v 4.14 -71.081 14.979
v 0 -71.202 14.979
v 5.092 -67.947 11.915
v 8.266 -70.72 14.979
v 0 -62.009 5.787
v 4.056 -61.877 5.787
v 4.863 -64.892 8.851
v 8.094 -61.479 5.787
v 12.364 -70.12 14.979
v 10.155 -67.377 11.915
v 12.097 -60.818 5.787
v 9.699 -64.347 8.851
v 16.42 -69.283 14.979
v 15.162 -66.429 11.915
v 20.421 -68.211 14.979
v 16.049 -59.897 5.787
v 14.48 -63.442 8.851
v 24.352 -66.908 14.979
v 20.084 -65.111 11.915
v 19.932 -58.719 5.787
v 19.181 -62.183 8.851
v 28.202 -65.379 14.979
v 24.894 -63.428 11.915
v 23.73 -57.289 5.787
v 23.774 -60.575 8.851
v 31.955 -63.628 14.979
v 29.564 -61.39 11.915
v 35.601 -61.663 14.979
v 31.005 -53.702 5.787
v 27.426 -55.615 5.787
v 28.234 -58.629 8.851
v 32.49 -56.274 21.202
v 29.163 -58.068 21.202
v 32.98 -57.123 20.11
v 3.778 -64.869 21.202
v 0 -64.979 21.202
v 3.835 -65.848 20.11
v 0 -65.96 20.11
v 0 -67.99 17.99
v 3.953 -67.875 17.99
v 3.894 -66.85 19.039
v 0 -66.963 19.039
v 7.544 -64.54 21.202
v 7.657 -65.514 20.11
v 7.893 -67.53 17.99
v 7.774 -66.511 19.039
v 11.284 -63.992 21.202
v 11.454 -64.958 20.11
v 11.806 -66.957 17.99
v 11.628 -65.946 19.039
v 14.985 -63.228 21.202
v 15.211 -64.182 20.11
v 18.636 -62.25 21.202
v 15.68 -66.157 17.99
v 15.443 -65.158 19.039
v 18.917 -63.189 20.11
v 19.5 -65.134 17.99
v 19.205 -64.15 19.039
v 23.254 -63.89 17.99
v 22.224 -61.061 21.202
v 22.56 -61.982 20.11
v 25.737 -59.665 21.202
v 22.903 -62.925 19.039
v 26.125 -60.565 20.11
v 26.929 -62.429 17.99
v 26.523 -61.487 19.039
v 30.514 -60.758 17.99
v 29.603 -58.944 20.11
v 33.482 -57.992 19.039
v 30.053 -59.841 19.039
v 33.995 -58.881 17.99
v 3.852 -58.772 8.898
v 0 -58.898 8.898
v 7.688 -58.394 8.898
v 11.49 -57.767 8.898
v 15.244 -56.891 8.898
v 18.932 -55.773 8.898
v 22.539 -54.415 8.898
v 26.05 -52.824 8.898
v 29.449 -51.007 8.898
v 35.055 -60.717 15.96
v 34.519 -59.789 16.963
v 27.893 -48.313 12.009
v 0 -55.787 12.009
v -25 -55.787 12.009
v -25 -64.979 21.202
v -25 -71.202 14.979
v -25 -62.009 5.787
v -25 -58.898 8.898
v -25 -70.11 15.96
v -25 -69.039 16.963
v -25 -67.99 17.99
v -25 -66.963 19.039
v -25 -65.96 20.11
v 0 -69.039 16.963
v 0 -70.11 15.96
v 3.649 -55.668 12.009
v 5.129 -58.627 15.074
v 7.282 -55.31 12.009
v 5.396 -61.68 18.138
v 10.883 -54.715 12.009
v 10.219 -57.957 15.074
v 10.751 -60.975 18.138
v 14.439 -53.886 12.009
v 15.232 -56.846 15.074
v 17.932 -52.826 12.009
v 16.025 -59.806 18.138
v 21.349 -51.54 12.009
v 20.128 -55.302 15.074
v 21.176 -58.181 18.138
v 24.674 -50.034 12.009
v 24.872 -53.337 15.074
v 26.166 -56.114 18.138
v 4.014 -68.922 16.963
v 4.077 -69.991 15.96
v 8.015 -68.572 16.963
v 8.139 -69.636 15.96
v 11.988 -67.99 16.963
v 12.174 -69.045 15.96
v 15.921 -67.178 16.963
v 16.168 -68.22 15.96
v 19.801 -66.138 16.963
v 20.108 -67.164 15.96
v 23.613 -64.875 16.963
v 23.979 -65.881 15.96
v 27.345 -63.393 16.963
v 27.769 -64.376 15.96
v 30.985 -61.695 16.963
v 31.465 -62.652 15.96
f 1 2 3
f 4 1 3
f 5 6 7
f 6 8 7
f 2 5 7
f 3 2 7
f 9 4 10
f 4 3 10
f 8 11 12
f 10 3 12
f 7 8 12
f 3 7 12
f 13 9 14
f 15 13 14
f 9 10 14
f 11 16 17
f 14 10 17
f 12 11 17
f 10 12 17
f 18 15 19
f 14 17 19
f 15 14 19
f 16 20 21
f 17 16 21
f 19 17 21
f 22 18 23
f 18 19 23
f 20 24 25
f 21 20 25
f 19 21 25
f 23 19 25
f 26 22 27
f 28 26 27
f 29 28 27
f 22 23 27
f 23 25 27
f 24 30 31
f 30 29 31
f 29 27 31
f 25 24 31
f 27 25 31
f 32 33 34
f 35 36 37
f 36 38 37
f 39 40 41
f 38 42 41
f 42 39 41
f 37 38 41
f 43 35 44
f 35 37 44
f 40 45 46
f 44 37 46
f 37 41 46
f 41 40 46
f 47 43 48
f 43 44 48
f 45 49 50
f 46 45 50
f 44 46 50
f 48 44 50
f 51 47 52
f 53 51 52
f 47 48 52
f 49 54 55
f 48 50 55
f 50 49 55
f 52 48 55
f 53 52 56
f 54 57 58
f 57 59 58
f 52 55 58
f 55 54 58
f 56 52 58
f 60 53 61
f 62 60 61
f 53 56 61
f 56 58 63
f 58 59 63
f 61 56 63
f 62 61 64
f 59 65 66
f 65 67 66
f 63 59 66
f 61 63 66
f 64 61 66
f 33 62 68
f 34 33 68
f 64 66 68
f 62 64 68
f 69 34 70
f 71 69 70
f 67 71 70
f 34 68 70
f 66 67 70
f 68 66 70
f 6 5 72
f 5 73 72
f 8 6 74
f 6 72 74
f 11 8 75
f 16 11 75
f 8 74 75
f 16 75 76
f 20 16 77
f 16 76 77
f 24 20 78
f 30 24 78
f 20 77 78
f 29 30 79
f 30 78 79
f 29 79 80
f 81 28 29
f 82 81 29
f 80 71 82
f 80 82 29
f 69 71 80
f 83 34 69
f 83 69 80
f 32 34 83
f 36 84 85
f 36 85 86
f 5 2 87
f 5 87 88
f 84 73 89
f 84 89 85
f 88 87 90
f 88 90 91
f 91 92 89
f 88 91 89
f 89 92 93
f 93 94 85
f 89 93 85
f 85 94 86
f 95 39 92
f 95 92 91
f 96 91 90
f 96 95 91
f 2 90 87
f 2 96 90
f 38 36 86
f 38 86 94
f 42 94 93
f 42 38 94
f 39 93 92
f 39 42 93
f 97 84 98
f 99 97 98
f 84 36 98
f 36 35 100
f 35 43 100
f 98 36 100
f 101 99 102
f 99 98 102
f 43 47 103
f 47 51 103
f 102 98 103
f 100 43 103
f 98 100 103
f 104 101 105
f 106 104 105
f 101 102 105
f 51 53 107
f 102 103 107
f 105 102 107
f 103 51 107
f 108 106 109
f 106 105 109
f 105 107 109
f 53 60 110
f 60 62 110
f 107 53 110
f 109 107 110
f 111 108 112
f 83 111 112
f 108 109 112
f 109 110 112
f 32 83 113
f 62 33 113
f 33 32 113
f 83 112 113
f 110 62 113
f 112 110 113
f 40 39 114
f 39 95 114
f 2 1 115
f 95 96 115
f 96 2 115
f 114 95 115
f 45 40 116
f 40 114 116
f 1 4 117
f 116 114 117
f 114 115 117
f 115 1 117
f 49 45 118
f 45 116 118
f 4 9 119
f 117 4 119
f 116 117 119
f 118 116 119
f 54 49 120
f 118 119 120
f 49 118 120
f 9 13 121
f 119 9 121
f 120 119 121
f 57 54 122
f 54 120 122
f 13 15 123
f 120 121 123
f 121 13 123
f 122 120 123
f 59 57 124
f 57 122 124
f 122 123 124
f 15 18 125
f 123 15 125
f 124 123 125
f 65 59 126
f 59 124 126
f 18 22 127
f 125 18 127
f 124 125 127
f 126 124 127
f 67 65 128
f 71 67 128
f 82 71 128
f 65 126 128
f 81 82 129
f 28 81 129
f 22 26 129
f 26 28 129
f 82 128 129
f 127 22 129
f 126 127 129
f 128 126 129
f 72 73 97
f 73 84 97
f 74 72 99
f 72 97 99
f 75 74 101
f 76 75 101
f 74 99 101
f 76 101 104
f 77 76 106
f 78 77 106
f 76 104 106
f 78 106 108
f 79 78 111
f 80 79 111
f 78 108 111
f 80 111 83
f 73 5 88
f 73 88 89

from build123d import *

# Parameters (mm, degrees)
F2_ANGLE = 30
F3_DEPTH = 25


with BuildPart() as f2:
    # F1 (on Right) → F2 (revolve)
    with BuildSketch(Plane.YZ):
        with BuildLine():
            Line((-55.786951, 12.00949), (-64.979339, 21.201879))
            ThreePointArc((-64.979339, 21.201879), (-66.458592, 19.571493), (-67.989844, 17.989844))
            Line((-67.989844, 17.989844), (-58.898221, 8.898221))
            Line((-58.898221, 8.898221), (-55.786951, 12.00949))
        make_face()
        with BuildLine():
            ThreePointArc((-67.989844, 17.989844), (-69.571493, 16.458592), (-71.201879, 14.979339))
            Line((-71.201879, 14.979339), (-62.00949, 5.786951))
            Line((-62.00949, 5.786951), (-58.898221, 8.898221))
            Line((-58.898221, 8.898221), (-67.989844, 17.989844))
        make_face()
    revolve(axis=Axis((0, 0, 12.074878), (0, 0, 1)), revolution_arc=F2_ANGLE)

    # F1 (on Right) → F3 (join)
    with BuildSketch(Plane.YZ):
        with BuildLine():
            ThreePointArc((-67.989844, 17.989844), (-69.571493, 16.458592), (-71.201879, 14.979339))
            Line((-71.201879, 14.979339), (-62.00949, 5.786951))
            Line((-62.00949, 5.786951), (-58.898221, 8.898221))
            Line((-58.898221, 8.898221), (-67.989844, 17.989844))
        make_face()
        with BuildLine():
            Line((-55.786951, 12.00949), (-64.979339, 21.201879))
            ThreePointArc((-64.979339, 21.201879), (-66.458592, 19.571493), (-67.989844, 17.989844))
            Line((-67.989844, 17.989844), (-58.898221, 8.898221))
            Line((-58.898221, 8.898221), (-55.786951, 12.00949))
        make_face()
    extrude(amount=-F3_DEPTH)


solid = f2.part
